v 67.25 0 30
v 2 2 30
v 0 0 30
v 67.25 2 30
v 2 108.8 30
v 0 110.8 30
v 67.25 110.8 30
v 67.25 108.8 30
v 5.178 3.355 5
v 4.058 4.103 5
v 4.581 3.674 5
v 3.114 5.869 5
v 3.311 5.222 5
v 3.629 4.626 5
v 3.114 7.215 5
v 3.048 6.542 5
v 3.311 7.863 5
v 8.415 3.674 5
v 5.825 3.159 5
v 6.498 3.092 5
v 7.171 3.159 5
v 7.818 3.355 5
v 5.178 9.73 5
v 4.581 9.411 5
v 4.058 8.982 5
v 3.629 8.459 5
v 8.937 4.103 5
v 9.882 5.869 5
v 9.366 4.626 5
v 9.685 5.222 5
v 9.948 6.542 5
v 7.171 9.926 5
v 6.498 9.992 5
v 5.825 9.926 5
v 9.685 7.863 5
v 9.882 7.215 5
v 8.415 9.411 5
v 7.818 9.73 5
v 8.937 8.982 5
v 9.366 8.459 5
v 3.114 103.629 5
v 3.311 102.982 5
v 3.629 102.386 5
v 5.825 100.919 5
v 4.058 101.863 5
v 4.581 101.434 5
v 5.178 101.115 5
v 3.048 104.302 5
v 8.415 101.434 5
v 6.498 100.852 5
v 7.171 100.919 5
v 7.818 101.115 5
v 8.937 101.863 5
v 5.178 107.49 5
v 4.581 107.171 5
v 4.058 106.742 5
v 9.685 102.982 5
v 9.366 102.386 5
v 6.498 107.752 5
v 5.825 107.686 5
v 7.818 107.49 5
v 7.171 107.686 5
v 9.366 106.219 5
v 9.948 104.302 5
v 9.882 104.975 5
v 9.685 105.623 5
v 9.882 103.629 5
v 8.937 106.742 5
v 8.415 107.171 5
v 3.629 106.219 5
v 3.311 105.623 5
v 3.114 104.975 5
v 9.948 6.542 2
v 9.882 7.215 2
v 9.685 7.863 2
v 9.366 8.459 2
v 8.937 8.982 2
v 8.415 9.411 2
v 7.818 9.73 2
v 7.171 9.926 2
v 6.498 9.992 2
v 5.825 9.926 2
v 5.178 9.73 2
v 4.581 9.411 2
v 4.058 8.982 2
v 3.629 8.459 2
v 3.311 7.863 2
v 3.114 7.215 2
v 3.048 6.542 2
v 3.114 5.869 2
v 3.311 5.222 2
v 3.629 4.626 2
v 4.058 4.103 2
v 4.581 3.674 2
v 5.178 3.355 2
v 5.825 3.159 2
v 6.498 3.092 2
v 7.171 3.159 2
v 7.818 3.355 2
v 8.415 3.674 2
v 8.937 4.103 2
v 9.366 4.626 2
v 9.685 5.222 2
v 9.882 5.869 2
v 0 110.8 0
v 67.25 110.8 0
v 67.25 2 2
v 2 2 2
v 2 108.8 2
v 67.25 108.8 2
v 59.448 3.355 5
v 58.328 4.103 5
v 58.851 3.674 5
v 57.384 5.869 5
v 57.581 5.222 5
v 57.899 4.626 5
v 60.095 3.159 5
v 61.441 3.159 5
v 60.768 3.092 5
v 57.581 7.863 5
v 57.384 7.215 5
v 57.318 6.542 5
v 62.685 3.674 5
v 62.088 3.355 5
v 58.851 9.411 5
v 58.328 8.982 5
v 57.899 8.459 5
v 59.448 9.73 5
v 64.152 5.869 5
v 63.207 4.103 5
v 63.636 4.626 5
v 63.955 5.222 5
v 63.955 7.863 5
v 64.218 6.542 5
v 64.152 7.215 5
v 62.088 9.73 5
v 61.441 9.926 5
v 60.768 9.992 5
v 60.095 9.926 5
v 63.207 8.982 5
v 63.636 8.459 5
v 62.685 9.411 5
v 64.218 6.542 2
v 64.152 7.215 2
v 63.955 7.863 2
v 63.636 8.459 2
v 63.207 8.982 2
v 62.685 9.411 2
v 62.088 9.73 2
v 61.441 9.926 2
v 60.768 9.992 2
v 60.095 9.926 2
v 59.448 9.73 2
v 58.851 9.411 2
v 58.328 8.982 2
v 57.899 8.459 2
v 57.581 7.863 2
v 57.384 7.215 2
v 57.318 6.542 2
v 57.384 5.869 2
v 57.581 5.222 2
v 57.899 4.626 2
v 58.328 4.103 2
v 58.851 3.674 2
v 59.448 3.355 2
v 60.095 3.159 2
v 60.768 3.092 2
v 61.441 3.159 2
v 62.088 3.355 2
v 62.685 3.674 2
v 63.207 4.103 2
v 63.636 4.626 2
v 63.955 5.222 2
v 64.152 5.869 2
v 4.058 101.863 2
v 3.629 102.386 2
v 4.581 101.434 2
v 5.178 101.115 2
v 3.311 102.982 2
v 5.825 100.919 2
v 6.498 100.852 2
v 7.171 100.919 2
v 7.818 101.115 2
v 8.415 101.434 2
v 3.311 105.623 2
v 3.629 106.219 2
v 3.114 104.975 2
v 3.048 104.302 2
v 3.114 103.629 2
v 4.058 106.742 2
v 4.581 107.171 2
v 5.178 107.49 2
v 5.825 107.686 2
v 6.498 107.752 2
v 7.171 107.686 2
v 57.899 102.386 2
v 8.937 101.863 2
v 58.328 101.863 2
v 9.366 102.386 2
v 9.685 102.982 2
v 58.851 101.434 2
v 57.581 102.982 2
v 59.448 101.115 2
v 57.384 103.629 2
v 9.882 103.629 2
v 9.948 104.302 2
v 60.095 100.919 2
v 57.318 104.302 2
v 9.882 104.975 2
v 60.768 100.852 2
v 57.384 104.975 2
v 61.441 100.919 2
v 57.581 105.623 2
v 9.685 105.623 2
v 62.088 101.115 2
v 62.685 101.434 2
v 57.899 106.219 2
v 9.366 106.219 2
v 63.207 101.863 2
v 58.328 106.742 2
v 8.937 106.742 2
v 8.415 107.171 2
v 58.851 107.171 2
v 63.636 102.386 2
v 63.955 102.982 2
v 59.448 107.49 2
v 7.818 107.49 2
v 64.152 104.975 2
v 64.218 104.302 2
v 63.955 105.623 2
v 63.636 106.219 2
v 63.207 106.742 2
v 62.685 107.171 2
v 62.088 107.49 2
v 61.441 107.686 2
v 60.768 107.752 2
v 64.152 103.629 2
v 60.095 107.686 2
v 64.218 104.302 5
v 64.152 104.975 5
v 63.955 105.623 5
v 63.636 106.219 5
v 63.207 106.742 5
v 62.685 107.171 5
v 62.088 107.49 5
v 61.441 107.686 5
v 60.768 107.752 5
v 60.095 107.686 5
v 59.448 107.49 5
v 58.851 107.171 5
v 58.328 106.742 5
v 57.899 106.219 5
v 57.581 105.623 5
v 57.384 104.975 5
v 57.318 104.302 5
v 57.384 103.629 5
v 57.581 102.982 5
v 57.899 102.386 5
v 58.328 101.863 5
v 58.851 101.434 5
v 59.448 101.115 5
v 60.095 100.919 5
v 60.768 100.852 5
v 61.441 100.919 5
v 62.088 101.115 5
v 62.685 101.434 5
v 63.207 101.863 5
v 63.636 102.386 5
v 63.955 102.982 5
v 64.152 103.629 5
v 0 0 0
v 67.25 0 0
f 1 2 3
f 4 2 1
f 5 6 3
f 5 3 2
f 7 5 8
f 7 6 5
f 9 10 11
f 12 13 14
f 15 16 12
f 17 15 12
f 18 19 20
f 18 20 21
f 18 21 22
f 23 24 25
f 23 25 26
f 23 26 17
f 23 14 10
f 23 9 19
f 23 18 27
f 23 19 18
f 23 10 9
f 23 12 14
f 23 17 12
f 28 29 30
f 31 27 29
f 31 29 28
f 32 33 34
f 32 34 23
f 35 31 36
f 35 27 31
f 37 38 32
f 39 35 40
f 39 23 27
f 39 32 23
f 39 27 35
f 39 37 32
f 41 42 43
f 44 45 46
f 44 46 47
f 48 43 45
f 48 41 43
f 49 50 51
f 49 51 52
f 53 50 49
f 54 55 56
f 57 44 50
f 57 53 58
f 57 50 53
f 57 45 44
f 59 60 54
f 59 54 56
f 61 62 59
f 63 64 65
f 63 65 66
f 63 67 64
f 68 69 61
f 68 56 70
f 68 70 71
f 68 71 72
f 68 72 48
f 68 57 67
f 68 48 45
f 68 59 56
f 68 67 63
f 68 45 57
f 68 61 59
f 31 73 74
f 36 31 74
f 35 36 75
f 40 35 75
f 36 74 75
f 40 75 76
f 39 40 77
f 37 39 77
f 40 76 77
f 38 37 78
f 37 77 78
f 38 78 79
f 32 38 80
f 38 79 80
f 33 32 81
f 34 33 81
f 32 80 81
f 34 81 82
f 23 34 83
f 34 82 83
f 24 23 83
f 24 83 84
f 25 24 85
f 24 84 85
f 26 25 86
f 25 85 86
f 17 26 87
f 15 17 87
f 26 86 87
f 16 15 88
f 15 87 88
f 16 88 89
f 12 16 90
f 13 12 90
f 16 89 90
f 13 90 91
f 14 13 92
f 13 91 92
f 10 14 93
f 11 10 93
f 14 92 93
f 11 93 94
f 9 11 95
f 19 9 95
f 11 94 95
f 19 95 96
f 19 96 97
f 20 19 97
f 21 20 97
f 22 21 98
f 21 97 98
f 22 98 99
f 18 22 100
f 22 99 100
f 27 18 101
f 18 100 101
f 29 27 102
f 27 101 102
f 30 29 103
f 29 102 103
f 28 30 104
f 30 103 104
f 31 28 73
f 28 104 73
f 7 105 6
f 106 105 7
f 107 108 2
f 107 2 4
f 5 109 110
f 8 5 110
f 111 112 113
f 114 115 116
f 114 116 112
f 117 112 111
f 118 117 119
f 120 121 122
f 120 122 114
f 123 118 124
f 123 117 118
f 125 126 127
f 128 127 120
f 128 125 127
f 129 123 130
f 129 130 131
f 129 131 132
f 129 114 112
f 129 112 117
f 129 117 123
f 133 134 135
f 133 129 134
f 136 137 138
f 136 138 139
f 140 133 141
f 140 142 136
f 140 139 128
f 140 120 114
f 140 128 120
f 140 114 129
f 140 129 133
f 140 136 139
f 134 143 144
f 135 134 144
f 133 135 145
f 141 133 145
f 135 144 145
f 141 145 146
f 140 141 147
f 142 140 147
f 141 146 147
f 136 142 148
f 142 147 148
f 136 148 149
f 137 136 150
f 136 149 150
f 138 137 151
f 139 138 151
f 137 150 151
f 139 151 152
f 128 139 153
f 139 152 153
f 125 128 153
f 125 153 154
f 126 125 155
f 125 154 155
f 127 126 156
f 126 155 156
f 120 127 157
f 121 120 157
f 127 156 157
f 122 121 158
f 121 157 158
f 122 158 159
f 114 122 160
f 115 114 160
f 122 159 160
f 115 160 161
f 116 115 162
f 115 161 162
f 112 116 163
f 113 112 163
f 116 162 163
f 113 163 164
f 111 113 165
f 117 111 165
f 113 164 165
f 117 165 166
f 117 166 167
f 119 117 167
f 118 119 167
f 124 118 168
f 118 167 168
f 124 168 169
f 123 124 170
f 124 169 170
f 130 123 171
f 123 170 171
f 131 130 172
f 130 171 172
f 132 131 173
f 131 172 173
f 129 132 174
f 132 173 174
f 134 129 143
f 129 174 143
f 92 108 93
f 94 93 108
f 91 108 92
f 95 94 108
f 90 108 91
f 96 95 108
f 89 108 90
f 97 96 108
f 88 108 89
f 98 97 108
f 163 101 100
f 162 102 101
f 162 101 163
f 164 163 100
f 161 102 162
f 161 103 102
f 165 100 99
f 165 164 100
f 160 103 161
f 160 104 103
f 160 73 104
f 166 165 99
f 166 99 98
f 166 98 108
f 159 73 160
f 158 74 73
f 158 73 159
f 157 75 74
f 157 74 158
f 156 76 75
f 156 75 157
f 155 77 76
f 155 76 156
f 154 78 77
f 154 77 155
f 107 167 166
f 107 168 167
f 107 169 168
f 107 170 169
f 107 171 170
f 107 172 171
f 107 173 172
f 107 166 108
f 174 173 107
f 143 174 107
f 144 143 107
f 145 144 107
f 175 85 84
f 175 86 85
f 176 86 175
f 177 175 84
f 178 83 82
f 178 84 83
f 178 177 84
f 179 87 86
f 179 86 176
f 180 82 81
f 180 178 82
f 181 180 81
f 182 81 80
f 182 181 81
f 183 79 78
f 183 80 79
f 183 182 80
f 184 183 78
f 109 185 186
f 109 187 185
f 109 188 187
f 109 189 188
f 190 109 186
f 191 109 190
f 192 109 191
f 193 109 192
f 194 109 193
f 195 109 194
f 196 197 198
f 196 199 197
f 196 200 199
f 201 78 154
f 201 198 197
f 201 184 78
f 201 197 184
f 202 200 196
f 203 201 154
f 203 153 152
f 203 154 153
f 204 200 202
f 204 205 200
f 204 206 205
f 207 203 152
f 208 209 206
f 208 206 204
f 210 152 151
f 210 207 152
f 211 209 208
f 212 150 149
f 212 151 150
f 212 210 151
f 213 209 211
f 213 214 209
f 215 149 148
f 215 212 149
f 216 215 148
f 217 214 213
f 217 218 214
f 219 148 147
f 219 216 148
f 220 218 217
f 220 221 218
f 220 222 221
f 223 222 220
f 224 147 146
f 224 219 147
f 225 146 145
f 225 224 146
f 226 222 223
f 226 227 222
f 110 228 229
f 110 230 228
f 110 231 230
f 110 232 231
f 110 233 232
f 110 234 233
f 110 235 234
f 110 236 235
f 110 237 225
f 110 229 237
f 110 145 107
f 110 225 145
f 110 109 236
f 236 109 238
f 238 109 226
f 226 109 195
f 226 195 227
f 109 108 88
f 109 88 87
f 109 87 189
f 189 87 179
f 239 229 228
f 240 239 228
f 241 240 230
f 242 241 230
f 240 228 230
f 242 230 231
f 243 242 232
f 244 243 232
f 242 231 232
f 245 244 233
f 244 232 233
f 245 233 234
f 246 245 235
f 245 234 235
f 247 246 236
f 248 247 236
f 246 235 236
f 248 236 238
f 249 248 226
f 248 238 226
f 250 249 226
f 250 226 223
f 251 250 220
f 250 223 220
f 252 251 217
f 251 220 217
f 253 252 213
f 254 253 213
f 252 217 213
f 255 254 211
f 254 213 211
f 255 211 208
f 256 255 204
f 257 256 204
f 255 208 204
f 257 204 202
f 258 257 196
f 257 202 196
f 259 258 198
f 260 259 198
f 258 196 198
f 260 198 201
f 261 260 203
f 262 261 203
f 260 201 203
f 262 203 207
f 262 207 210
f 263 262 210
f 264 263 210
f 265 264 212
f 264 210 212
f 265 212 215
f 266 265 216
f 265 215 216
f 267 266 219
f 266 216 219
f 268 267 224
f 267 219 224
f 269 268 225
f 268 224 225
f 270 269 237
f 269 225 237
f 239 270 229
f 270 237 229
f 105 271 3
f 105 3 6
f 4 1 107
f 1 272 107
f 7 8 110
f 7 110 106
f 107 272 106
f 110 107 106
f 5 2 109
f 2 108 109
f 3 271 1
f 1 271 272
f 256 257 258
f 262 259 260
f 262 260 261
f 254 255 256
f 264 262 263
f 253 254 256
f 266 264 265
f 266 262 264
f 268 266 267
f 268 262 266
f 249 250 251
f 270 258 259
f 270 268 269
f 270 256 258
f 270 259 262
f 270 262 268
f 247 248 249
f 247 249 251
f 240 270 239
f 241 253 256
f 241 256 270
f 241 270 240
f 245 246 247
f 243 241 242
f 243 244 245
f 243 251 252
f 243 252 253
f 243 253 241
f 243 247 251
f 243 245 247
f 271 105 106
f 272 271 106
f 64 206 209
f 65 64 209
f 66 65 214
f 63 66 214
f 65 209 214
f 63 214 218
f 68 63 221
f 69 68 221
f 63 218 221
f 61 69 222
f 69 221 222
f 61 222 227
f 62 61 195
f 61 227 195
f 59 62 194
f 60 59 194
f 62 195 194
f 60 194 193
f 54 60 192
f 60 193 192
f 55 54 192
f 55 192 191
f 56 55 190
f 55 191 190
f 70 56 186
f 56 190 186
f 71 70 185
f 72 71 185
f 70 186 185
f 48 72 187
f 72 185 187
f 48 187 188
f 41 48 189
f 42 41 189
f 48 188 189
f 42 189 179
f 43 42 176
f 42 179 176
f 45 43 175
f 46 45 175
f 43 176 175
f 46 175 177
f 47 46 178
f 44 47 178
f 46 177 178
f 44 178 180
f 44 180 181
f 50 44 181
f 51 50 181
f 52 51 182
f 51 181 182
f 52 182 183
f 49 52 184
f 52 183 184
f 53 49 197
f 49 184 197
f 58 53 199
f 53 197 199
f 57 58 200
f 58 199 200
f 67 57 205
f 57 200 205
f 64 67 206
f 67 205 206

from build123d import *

# Parameters (mm, degrees)
SKETCH_W     = 67.25
SKETCH_H     = 110.8
PAD_DEPTH    = 30
THICKNESS_T  = -2
SKETCH001_R  = 3.45
PAD001_DEPTH = 3


with BuildPart() as part:
    # Sketch → Pad (new body)
    with BuildSketch(Plane.XY):
        with Locations((33.625, 55.4)):
            Rectangle(SKETCH_W, SKETCH_H)
    extrude(amount=PAD_DEPTH)

    # Thickness
    thickness_openings = [part.faces().sort_by_distance(p)[0] for p in [
        (33.625, 55.4, 30),
        (67.25, 55.4, 15),
    ]]
    offset(amount=THICKNESS_T, openings=thickness_openings)

    # Sketch001 (on Face9 of Thickness) → Pad001 (join)
    with BuildSketch(Plane.XY.offset(2)):
        with Locations((6.497925, 104.302401)):
            Circle(SKETCH001_R)
        with Locations((60.767925, 104.302401)):
            Circle(SKETCH001_R)
        with Locations((60.767925, 6.542401)):
            Circle(SKETCH001_R)
        with Locations((6.497925, 6.542401)):
            Circle(SKETCH001_R)
    extrude(amount=PAD001_DEPTH)


solid = part.part
